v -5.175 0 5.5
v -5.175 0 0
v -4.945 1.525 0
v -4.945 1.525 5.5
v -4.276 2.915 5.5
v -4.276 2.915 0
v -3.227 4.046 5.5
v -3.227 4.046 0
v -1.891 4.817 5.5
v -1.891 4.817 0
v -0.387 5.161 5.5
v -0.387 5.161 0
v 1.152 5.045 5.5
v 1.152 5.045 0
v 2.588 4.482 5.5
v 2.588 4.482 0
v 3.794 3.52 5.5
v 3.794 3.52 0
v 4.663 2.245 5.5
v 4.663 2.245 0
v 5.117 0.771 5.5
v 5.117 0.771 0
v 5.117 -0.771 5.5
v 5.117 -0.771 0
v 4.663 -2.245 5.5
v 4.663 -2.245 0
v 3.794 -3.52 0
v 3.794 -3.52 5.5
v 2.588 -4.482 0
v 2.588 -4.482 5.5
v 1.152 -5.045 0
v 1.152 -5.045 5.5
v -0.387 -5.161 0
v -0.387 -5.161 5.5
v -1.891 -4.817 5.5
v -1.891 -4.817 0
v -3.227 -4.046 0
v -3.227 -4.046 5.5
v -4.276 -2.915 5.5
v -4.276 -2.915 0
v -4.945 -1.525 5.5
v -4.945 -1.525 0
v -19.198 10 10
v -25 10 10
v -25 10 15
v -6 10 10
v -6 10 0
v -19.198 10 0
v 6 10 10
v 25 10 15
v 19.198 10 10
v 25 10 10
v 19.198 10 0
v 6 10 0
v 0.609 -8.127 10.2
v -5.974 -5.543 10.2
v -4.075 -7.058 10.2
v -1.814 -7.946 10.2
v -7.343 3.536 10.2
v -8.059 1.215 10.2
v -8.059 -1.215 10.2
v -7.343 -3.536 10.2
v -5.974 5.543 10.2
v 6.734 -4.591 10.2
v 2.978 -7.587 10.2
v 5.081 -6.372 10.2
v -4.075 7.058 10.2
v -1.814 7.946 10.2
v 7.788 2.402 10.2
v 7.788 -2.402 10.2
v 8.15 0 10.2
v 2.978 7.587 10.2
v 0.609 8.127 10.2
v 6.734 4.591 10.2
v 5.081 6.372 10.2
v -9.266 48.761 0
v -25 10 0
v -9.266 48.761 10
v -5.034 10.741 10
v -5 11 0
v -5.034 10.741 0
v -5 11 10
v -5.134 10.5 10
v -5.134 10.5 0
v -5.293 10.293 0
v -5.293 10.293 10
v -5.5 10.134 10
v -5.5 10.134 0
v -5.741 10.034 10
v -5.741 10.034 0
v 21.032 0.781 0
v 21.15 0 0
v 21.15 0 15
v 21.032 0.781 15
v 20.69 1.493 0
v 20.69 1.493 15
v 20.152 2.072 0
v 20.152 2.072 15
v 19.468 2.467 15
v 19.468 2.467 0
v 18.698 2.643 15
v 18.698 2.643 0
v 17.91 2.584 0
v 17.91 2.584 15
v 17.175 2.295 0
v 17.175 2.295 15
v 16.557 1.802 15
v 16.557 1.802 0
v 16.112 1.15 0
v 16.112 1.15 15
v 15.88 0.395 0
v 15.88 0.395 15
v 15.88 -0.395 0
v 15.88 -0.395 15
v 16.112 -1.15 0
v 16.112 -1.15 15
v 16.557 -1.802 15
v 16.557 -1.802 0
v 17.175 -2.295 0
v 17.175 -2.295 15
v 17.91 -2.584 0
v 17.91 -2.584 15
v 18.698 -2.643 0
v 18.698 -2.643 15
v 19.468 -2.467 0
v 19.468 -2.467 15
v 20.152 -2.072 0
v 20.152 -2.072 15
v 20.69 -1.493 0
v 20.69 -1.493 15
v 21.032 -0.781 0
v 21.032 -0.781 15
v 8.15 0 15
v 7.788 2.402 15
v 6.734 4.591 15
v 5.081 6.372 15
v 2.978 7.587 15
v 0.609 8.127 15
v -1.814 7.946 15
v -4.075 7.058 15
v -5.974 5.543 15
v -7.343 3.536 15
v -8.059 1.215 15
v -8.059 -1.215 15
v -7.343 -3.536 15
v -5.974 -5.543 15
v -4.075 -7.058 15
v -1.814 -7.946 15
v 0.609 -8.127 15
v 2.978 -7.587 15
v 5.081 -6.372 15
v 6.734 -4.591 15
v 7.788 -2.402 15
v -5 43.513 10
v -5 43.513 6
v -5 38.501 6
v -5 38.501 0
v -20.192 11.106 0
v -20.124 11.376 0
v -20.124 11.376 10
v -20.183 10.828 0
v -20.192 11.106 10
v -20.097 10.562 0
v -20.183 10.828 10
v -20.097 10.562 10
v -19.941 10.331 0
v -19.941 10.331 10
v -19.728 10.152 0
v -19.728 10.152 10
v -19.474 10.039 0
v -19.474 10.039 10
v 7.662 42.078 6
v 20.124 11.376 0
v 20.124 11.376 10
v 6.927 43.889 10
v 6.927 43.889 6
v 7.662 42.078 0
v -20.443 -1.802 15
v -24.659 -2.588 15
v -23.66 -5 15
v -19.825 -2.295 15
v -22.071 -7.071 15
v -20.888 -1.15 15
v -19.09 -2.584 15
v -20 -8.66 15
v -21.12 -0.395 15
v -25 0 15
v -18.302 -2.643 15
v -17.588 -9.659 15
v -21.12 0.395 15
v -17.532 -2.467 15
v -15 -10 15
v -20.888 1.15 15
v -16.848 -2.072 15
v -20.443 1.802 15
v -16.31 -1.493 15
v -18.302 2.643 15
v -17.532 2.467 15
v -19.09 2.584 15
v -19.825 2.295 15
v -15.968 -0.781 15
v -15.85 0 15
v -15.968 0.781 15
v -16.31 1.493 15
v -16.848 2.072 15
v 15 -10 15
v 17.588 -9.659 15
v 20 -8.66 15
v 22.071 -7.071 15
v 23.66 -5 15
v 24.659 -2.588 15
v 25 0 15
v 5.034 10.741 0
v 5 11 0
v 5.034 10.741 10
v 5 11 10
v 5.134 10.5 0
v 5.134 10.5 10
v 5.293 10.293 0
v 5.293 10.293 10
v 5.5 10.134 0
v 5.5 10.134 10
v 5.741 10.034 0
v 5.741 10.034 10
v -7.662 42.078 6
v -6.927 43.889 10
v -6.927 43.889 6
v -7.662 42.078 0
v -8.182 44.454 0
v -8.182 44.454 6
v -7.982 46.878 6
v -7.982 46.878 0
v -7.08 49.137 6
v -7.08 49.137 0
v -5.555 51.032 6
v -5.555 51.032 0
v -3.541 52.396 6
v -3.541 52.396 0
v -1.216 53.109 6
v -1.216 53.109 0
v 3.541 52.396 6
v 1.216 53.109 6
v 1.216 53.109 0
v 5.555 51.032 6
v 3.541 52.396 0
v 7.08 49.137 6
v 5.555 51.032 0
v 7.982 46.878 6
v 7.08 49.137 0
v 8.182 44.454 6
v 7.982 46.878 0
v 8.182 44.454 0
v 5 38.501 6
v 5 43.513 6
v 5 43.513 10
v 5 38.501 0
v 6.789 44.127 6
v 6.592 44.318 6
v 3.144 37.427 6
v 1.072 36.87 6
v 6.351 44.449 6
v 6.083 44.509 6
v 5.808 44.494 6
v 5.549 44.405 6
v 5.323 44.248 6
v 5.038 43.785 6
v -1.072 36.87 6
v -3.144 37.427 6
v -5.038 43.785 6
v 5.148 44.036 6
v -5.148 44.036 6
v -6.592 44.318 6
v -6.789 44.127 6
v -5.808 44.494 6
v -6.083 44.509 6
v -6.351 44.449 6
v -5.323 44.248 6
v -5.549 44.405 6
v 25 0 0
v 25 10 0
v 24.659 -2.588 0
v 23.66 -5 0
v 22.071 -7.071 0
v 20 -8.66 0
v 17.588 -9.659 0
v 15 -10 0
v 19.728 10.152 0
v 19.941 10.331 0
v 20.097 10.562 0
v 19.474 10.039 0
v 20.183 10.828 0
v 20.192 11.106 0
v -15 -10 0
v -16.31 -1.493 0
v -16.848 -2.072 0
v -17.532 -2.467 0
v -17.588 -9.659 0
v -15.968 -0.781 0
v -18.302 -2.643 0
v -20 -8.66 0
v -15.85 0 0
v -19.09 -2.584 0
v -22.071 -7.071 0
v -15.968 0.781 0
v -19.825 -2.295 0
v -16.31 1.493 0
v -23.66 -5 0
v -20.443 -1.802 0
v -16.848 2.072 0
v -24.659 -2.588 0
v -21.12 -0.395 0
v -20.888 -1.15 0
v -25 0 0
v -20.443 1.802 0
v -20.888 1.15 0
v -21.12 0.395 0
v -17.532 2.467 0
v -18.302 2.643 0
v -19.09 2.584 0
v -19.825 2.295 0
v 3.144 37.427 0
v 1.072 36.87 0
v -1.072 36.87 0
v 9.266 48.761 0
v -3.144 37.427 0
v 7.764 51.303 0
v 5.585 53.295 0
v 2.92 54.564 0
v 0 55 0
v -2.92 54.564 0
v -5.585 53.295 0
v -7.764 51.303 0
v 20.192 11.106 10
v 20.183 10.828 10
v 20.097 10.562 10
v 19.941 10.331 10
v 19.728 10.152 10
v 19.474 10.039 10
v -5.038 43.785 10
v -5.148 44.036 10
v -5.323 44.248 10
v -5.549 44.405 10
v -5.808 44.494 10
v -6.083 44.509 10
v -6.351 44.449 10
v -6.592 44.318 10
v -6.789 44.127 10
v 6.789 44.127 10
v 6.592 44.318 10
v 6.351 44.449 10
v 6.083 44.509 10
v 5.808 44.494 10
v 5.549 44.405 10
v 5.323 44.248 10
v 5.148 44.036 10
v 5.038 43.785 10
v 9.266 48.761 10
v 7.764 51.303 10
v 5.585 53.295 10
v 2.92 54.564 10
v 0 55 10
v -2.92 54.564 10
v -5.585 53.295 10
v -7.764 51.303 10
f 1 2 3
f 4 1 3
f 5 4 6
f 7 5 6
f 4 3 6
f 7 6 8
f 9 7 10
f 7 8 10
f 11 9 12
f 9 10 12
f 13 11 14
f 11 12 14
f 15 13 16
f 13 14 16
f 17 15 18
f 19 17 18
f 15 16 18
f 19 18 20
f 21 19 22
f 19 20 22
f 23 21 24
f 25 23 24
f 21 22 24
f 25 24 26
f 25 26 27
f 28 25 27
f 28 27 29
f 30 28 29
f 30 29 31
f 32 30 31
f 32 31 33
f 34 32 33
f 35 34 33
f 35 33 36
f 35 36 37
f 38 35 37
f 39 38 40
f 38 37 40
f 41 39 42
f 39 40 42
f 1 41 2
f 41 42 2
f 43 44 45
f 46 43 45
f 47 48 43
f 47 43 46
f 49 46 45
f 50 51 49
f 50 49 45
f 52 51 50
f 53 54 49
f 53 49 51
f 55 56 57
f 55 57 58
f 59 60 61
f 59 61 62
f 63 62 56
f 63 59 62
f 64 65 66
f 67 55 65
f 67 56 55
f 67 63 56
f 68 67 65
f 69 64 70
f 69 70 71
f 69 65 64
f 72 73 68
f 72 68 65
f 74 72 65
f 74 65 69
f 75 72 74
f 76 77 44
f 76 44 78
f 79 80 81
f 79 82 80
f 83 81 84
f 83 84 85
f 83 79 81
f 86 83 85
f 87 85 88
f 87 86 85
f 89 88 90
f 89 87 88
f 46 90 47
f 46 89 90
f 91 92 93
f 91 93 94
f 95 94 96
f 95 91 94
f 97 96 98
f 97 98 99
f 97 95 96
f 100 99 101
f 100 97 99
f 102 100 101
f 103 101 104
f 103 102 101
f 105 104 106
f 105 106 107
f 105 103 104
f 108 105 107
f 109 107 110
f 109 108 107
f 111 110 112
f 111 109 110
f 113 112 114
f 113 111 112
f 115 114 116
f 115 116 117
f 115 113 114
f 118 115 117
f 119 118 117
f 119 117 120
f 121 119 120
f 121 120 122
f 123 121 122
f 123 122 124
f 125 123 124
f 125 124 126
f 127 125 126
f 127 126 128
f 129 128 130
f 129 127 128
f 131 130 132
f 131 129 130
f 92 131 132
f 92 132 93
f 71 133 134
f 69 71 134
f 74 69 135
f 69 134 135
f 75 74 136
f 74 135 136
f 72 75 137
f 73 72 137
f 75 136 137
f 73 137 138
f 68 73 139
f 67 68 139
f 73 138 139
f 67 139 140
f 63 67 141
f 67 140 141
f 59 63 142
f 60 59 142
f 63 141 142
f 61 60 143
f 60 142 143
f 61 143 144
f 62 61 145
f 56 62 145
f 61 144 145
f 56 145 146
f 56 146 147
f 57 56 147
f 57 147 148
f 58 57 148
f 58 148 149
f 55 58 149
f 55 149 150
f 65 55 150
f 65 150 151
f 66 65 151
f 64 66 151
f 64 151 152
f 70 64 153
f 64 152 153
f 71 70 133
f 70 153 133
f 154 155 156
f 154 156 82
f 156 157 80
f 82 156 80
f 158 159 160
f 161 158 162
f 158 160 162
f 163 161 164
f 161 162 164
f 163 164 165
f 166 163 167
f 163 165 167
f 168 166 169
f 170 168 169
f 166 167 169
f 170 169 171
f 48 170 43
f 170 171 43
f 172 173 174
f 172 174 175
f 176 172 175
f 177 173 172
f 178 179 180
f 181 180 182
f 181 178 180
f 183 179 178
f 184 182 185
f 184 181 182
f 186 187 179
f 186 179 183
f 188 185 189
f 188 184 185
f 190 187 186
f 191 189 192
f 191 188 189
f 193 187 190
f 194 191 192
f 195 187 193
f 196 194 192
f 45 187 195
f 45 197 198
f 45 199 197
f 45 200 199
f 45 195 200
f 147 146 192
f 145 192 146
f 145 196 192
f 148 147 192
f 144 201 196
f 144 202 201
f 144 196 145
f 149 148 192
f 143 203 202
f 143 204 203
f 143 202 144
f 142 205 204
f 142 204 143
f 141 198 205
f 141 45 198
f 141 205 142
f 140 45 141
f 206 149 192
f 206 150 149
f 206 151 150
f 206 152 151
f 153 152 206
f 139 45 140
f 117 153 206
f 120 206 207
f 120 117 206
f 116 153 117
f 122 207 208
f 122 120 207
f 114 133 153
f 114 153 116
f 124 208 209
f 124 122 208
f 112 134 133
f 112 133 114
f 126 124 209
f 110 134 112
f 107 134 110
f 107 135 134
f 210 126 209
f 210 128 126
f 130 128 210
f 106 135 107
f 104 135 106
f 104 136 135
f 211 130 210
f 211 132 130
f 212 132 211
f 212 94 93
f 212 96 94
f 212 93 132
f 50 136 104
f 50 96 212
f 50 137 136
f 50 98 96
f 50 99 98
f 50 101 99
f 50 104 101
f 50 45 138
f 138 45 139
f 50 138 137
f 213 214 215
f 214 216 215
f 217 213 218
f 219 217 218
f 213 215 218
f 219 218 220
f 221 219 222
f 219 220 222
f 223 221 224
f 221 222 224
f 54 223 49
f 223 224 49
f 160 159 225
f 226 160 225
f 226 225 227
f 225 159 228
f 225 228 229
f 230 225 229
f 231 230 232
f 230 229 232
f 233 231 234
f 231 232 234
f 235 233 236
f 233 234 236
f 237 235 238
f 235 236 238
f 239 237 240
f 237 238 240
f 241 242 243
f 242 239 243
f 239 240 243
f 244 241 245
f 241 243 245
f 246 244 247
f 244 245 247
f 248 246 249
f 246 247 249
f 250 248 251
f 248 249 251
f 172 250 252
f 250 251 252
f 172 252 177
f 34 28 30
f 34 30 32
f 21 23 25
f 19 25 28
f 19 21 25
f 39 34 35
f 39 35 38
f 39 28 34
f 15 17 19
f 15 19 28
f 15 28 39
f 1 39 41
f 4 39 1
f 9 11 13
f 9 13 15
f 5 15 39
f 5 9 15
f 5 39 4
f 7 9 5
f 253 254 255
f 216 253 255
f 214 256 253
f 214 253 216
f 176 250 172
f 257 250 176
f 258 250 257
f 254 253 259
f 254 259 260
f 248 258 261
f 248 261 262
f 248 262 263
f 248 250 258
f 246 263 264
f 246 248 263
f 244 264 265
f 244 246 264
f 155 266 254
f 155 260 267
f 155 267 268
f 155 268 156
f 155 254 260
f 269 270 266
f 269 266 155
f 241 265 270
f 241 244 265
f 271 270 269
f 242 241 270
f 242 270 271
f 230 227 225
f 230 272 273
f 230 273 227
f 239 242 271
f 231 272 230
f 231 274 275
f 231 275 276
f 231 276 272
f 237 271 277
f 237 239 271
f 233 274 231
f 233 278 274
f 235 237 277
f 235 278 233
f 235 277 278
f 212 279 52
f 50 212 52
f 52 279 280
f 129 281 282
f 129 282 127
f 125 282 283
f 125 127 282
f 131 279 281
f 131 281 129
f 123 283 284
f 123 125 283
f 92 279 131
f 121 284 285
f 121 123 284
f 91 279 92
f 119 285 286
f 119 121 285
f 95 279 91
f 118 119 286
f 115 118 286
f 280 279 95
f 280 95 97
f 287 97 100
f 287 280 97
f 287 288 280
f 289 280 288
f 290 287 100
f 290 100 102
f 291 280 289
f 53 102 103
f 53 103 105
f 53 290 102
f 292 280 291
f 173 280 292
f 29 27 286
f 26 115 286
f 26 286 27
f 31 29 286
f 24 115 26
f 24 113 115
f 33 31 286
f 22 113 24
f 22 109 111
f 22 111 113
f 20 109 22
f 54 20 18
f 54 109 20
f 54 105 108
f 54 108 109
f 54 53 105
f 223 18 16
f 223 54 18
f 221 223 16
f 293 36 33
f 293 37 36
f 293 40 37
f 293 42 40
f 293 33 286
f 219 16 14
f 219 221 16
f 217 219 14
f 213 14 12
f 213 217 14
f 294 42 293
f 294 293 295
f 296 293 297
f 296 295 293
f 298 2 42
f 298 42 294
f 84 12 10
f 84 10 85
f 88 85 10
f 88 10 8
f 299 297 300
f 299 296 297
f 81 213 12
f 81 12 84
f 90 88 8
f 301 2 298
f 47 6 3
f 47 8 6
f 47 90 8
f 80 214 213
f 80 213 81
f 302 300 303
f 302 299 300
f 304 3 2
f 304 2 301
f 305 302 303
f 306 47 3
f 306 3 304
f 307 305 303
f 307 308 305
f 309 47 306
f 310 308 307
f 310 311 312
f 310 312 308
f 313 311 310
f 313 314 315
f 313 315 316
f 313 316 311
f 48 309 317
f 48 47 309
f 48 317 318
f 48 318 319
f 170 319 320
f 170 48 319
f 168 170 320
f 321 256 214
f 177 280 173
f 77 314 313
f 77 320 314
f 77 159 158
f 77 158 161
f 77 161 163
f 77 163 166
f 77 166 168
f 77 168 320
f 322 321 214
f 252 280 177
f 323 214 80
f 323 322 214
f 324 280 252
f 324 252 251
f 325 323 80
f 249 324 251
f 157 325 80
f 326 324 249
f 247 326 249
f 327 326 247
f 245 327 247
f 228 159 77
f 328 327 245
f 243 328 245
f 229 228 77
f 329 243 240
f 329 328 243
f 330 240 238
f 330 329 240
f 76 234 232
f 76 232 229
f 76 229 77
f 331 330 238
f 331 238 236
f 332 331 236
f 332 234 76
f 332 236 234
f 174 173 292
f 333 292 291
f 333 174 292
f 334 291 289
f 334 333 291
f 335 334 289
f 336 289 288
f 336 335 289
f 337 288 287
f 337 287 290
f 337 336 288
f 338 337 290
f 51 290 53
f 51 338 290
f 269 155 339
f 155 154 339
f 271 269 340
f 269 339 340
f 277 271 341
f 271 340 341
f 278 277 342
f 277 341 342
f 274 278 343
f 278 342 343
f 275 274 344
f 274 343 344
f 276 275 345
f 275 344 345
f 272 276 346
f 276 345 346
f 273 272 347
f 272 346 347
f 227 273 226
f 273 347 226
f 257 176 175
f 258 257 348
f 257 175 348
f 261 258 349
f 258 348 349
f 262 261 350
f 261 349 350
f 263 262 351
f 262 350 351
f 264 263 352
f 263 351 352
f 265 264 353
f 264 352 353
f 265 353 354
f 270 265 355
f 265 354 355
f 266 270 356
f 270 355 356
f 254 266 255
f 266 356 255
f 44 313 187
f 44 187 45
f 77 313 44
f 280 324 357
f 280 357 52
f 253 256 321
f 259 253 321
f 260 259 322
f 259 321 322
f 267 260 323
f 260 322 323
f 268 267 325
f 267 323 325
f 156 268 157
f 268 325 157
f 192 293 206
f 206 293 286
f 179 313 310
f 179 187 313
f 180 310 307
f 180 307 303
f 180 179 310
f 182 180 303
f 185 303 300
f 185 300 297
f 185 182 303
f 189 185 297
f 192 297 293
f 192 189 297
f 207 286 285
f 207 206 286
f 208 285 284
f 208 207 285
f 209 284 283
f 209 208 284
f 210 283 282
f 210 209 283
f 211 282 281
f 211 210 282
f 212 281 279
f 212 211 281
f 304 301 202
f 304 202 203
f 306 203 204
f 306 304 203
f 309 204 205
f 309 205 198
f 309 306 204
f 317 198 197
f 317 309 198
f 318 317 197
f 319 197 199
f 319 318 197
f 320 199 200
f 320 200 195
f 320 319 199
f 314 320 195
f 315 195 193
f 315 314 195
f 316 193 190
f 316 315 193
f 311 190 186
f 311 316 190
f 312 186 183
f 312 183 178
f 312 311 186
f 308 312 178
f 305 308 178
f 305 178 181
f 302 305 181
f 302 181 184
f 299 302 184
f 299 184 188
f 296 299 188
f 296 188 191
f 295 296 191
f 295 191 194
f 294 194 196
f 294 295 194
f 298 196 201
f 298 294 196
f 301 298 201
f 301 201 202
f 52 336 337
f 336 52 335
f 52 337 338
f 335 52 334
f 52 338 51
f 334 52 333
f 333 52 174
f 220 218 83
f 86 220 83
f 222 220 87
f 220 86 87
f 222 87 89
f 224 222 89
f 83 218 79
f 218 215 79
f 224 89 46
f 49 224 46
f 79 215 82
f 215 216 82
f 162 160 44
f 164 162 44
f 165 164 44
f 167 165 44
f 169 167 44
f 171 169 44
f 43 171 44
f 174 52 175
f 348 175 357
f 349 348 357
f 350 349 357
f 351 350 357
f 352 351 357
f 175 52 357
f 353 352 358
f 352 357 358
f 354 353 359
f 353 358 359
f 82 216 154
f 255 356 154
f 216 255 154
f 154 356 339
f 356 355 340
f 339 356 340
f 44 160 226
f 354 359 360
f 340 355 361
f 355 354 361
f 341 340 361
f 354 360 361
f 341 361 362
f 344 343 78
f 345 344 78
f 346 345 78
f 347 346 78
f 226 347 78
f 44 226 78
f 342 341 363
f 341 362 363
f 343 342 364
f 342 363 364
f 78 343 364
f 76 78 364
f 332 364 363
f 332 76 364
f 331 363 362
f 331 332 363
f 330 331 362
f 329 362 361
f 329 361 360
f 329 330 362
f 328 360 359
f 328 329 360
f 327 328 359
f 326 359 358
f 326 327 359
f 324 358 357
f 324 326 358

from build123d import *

# Parameters (mm, degrees)
SKETCH_1_W          = 50
SKETCH_1_H          = 20
SKETCH_1_R          = 2.65
EXTRUDE_1_DEPTH     = 15
SKETCH_2_R          = 5.175
CUT_EXTRUDE_1_DEPTH = 5.5
SKETCH_3_R          = 8.15
CUT_EXTRUDE_2_DEPTH = 4.8
EXTRUDE_2_DEPTH     = 10
SKETCH_5_R          = 8.2
CUT_EXTRUDE_3_DEPTH = 6
CUT_EXTRUDE_4_DEPTH = 63.24949799
FILLET_1_R          = 1
FILLET_3_R          = 10


with BuildPart() as part:
    # 草图1 → 凸台-拉伸1 (new body)
    with BuildSketch(Plane.XY):
        Rectangle(SKETCH_1_W, SKETCH_1_H)
        with Locations((-18.5, 0)):
            Circle(SKETCH_1_R, mode=Mode.SUBTRACT)
        with Locations((18.5, 0)):
            Circle(SKETCH_1_R, mode=Mode.SUBTRACT)
    extrude(amount=EXTRUDE_1_DEPTH)

    # 草图2 → 切除-拉伸1 (cut)
    with BuildSketch(Plane(origin=(0, 0, 0), x_dir=(-1, 0, 0), z_dir=(0, 0, -1))):
        Circle(SKETCH_2_R)
    extrude(amount=-CUT_EXTRUDE_1_DEPTH, mode=Mode.SUBTRACT)

    # 草图3 → 切除-拉伸2 (cut)
    with BuildSketch(Plane.XY.offset(15)):
        Circle(SKETCH_3_R)
    extrude(amount=-CUT_EXTRUDE_2_DEPTH, mode=Mode.SUBTRACT)

    # 草图4 → 凸台-拉伸2 (add)
    with BuildSketch(Plane(origin=(0, 0, 0), x_dir=(-1, 0, 0), z_dir=(0, 0, -1))):
        with BuildLine():
            Line((25, 10), (9.265702954, 48.761216396))
            ThreePointArc((9.265702954, 48.761216396), (0, 55), (-9.265702954, 48.761216396))
            Line((-9.265702954, 48.761216396), (-25, 10))
            Line((-25, 10), (25, 10))
        make_face()
    extrude(amount=-EXTRUDE_2_DEPTH)

    # 草图5 → 切除-拉伸3 (cut)
    with BuildSketch(Plane(origin=(0, 0, 0), x_dir=(-1, 0, 0), z_dir=(0, 0, -1))):
        with Locations((0, 45)):
            Circle(SKETCH_5_R)
    extrude(amount=-CUT_EXTRUDE_3_DEPTH, mode=Mode.SUBTRACT)

    # 草图6 → 切除-拉伸4 (cut, through all)
    with BuildSketch(Plane(origin=(0, 0, 0), x_dir=(-1, 0, 0), z_dir=(0, 0, -1))):
        Polygon((-20.683004279, 10), (-5, 48.634857396), (-5, 10), align=None)
        Polygon((5, 10), (20.683004279, 10), (5, 48.634857396), align=None)
    extrude(amount=-CUT_EXTRUDE_4_DEPTH, mode=Mode.SUBTRACT)

    # 圆角1
    fillet_1_edges = [part.edges().sort_by_distance(p)[0] for p in [
        (5, 10, 5),
        (20.683004279, 10, 5),
        (5, 48.634857396, 8),
        (-20.683004279, 10, 5),
        (-5, 10, 5),
        (-5, 48.634857396, 8),
    ]]
    fillet(fillet_1_edges, radius=FILLET_1_R)

    # 圆角3
    fillet_3_edges = [part.edges().sort_by_distance(p)[0] for p in [
        (25, -10, 7.5),
        (-25, -10, 7.5),
    ]]
    fillet(fillet_3_edges, radius=FILLET_3_R)


solid = part.part
